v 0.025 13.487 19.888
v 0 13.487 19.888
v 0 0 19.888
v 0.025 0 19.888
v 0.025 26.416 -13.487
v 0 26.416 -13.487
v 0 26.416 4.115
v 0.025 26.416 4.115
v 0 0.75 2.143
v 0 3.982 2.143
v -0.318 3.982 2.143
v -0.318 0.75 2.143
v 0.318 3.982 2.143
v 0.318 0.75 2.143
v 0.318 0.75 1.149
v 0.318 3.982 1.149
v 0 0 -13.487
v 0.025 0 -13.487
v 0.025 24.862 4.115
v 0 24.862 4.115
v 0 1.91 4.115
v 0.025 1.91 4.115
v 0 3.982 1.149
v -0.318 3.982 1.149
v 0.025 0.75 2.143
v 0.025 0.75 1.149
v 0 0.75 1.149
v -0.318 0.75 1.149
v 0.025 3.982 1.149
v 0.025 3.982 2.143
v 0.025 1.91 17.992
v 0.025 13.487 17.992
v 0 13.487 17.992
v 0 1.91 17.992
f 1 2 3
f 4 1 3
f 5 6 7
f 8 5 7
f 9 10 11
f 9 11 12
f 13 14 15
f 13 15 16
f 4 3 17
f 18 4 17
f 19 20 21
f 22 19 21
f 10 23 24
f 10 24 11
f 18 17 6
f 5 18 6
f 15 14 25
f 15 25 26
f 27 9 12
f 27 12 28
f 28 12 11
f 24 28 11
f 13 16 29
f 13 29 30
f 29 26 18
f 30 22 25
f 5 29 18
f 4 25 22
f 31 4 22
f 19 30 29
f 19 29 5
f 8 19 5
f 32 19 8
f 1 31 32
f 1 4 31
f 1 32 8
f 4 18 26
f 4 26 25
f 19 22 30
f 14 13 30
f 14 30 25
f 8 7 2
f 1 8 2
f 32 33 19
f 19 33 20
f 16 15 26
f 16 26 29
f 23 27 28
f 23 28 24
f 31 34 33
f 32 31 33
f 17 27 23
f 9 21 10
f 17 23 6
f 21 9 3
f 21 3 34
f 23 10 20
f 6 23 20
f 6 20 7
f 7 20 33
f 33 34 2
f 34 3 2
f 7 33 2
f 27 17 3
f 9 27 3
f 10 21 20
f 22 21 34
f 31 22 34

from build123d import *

# Parameters (mm, degrees)
F1_DEPTH = 0.3175
F2_DEPTH = 0.0254


with BuildPart() as f1:
    # F0 (on Right) → F1 (new body, symmetric)
    with BuildSketch(Plane.YZ):
        Polygon((3.981895, 2.143248), (1.910463, 2.143248), (0.750461, 2.143248), (0.750461, 1.148961), (3.981895, 1.148961), align=None)
    extrude(amount=F1_DEPTH, both=True)

    # F0 (on Right) → F2 (join)
    with BuildSketch(Plane.YZ):
        Polygon((13.4874, 19.8882), (0, 19.8882), (0, -13.4874), (26.416, -13.4874), (26.416, 4.1148), align=None)
        Polygon((0.750461, 2.143248), (1.910463, 2.143248), (3.981895, 2.143248), (3.981895, 1.148961), (0.750461, 1.148961), align=None, mode=Mode.SUBTRACT)
        Polygon((24.861934, 4.1148), (1.910463, 4.1148), (1.910463, 17.992178), (13.4874, 17.992178), align=None, mode=Mode.SUBTRACT)
    extrude(amount=F2_DEPTH)


solid = f1.part
